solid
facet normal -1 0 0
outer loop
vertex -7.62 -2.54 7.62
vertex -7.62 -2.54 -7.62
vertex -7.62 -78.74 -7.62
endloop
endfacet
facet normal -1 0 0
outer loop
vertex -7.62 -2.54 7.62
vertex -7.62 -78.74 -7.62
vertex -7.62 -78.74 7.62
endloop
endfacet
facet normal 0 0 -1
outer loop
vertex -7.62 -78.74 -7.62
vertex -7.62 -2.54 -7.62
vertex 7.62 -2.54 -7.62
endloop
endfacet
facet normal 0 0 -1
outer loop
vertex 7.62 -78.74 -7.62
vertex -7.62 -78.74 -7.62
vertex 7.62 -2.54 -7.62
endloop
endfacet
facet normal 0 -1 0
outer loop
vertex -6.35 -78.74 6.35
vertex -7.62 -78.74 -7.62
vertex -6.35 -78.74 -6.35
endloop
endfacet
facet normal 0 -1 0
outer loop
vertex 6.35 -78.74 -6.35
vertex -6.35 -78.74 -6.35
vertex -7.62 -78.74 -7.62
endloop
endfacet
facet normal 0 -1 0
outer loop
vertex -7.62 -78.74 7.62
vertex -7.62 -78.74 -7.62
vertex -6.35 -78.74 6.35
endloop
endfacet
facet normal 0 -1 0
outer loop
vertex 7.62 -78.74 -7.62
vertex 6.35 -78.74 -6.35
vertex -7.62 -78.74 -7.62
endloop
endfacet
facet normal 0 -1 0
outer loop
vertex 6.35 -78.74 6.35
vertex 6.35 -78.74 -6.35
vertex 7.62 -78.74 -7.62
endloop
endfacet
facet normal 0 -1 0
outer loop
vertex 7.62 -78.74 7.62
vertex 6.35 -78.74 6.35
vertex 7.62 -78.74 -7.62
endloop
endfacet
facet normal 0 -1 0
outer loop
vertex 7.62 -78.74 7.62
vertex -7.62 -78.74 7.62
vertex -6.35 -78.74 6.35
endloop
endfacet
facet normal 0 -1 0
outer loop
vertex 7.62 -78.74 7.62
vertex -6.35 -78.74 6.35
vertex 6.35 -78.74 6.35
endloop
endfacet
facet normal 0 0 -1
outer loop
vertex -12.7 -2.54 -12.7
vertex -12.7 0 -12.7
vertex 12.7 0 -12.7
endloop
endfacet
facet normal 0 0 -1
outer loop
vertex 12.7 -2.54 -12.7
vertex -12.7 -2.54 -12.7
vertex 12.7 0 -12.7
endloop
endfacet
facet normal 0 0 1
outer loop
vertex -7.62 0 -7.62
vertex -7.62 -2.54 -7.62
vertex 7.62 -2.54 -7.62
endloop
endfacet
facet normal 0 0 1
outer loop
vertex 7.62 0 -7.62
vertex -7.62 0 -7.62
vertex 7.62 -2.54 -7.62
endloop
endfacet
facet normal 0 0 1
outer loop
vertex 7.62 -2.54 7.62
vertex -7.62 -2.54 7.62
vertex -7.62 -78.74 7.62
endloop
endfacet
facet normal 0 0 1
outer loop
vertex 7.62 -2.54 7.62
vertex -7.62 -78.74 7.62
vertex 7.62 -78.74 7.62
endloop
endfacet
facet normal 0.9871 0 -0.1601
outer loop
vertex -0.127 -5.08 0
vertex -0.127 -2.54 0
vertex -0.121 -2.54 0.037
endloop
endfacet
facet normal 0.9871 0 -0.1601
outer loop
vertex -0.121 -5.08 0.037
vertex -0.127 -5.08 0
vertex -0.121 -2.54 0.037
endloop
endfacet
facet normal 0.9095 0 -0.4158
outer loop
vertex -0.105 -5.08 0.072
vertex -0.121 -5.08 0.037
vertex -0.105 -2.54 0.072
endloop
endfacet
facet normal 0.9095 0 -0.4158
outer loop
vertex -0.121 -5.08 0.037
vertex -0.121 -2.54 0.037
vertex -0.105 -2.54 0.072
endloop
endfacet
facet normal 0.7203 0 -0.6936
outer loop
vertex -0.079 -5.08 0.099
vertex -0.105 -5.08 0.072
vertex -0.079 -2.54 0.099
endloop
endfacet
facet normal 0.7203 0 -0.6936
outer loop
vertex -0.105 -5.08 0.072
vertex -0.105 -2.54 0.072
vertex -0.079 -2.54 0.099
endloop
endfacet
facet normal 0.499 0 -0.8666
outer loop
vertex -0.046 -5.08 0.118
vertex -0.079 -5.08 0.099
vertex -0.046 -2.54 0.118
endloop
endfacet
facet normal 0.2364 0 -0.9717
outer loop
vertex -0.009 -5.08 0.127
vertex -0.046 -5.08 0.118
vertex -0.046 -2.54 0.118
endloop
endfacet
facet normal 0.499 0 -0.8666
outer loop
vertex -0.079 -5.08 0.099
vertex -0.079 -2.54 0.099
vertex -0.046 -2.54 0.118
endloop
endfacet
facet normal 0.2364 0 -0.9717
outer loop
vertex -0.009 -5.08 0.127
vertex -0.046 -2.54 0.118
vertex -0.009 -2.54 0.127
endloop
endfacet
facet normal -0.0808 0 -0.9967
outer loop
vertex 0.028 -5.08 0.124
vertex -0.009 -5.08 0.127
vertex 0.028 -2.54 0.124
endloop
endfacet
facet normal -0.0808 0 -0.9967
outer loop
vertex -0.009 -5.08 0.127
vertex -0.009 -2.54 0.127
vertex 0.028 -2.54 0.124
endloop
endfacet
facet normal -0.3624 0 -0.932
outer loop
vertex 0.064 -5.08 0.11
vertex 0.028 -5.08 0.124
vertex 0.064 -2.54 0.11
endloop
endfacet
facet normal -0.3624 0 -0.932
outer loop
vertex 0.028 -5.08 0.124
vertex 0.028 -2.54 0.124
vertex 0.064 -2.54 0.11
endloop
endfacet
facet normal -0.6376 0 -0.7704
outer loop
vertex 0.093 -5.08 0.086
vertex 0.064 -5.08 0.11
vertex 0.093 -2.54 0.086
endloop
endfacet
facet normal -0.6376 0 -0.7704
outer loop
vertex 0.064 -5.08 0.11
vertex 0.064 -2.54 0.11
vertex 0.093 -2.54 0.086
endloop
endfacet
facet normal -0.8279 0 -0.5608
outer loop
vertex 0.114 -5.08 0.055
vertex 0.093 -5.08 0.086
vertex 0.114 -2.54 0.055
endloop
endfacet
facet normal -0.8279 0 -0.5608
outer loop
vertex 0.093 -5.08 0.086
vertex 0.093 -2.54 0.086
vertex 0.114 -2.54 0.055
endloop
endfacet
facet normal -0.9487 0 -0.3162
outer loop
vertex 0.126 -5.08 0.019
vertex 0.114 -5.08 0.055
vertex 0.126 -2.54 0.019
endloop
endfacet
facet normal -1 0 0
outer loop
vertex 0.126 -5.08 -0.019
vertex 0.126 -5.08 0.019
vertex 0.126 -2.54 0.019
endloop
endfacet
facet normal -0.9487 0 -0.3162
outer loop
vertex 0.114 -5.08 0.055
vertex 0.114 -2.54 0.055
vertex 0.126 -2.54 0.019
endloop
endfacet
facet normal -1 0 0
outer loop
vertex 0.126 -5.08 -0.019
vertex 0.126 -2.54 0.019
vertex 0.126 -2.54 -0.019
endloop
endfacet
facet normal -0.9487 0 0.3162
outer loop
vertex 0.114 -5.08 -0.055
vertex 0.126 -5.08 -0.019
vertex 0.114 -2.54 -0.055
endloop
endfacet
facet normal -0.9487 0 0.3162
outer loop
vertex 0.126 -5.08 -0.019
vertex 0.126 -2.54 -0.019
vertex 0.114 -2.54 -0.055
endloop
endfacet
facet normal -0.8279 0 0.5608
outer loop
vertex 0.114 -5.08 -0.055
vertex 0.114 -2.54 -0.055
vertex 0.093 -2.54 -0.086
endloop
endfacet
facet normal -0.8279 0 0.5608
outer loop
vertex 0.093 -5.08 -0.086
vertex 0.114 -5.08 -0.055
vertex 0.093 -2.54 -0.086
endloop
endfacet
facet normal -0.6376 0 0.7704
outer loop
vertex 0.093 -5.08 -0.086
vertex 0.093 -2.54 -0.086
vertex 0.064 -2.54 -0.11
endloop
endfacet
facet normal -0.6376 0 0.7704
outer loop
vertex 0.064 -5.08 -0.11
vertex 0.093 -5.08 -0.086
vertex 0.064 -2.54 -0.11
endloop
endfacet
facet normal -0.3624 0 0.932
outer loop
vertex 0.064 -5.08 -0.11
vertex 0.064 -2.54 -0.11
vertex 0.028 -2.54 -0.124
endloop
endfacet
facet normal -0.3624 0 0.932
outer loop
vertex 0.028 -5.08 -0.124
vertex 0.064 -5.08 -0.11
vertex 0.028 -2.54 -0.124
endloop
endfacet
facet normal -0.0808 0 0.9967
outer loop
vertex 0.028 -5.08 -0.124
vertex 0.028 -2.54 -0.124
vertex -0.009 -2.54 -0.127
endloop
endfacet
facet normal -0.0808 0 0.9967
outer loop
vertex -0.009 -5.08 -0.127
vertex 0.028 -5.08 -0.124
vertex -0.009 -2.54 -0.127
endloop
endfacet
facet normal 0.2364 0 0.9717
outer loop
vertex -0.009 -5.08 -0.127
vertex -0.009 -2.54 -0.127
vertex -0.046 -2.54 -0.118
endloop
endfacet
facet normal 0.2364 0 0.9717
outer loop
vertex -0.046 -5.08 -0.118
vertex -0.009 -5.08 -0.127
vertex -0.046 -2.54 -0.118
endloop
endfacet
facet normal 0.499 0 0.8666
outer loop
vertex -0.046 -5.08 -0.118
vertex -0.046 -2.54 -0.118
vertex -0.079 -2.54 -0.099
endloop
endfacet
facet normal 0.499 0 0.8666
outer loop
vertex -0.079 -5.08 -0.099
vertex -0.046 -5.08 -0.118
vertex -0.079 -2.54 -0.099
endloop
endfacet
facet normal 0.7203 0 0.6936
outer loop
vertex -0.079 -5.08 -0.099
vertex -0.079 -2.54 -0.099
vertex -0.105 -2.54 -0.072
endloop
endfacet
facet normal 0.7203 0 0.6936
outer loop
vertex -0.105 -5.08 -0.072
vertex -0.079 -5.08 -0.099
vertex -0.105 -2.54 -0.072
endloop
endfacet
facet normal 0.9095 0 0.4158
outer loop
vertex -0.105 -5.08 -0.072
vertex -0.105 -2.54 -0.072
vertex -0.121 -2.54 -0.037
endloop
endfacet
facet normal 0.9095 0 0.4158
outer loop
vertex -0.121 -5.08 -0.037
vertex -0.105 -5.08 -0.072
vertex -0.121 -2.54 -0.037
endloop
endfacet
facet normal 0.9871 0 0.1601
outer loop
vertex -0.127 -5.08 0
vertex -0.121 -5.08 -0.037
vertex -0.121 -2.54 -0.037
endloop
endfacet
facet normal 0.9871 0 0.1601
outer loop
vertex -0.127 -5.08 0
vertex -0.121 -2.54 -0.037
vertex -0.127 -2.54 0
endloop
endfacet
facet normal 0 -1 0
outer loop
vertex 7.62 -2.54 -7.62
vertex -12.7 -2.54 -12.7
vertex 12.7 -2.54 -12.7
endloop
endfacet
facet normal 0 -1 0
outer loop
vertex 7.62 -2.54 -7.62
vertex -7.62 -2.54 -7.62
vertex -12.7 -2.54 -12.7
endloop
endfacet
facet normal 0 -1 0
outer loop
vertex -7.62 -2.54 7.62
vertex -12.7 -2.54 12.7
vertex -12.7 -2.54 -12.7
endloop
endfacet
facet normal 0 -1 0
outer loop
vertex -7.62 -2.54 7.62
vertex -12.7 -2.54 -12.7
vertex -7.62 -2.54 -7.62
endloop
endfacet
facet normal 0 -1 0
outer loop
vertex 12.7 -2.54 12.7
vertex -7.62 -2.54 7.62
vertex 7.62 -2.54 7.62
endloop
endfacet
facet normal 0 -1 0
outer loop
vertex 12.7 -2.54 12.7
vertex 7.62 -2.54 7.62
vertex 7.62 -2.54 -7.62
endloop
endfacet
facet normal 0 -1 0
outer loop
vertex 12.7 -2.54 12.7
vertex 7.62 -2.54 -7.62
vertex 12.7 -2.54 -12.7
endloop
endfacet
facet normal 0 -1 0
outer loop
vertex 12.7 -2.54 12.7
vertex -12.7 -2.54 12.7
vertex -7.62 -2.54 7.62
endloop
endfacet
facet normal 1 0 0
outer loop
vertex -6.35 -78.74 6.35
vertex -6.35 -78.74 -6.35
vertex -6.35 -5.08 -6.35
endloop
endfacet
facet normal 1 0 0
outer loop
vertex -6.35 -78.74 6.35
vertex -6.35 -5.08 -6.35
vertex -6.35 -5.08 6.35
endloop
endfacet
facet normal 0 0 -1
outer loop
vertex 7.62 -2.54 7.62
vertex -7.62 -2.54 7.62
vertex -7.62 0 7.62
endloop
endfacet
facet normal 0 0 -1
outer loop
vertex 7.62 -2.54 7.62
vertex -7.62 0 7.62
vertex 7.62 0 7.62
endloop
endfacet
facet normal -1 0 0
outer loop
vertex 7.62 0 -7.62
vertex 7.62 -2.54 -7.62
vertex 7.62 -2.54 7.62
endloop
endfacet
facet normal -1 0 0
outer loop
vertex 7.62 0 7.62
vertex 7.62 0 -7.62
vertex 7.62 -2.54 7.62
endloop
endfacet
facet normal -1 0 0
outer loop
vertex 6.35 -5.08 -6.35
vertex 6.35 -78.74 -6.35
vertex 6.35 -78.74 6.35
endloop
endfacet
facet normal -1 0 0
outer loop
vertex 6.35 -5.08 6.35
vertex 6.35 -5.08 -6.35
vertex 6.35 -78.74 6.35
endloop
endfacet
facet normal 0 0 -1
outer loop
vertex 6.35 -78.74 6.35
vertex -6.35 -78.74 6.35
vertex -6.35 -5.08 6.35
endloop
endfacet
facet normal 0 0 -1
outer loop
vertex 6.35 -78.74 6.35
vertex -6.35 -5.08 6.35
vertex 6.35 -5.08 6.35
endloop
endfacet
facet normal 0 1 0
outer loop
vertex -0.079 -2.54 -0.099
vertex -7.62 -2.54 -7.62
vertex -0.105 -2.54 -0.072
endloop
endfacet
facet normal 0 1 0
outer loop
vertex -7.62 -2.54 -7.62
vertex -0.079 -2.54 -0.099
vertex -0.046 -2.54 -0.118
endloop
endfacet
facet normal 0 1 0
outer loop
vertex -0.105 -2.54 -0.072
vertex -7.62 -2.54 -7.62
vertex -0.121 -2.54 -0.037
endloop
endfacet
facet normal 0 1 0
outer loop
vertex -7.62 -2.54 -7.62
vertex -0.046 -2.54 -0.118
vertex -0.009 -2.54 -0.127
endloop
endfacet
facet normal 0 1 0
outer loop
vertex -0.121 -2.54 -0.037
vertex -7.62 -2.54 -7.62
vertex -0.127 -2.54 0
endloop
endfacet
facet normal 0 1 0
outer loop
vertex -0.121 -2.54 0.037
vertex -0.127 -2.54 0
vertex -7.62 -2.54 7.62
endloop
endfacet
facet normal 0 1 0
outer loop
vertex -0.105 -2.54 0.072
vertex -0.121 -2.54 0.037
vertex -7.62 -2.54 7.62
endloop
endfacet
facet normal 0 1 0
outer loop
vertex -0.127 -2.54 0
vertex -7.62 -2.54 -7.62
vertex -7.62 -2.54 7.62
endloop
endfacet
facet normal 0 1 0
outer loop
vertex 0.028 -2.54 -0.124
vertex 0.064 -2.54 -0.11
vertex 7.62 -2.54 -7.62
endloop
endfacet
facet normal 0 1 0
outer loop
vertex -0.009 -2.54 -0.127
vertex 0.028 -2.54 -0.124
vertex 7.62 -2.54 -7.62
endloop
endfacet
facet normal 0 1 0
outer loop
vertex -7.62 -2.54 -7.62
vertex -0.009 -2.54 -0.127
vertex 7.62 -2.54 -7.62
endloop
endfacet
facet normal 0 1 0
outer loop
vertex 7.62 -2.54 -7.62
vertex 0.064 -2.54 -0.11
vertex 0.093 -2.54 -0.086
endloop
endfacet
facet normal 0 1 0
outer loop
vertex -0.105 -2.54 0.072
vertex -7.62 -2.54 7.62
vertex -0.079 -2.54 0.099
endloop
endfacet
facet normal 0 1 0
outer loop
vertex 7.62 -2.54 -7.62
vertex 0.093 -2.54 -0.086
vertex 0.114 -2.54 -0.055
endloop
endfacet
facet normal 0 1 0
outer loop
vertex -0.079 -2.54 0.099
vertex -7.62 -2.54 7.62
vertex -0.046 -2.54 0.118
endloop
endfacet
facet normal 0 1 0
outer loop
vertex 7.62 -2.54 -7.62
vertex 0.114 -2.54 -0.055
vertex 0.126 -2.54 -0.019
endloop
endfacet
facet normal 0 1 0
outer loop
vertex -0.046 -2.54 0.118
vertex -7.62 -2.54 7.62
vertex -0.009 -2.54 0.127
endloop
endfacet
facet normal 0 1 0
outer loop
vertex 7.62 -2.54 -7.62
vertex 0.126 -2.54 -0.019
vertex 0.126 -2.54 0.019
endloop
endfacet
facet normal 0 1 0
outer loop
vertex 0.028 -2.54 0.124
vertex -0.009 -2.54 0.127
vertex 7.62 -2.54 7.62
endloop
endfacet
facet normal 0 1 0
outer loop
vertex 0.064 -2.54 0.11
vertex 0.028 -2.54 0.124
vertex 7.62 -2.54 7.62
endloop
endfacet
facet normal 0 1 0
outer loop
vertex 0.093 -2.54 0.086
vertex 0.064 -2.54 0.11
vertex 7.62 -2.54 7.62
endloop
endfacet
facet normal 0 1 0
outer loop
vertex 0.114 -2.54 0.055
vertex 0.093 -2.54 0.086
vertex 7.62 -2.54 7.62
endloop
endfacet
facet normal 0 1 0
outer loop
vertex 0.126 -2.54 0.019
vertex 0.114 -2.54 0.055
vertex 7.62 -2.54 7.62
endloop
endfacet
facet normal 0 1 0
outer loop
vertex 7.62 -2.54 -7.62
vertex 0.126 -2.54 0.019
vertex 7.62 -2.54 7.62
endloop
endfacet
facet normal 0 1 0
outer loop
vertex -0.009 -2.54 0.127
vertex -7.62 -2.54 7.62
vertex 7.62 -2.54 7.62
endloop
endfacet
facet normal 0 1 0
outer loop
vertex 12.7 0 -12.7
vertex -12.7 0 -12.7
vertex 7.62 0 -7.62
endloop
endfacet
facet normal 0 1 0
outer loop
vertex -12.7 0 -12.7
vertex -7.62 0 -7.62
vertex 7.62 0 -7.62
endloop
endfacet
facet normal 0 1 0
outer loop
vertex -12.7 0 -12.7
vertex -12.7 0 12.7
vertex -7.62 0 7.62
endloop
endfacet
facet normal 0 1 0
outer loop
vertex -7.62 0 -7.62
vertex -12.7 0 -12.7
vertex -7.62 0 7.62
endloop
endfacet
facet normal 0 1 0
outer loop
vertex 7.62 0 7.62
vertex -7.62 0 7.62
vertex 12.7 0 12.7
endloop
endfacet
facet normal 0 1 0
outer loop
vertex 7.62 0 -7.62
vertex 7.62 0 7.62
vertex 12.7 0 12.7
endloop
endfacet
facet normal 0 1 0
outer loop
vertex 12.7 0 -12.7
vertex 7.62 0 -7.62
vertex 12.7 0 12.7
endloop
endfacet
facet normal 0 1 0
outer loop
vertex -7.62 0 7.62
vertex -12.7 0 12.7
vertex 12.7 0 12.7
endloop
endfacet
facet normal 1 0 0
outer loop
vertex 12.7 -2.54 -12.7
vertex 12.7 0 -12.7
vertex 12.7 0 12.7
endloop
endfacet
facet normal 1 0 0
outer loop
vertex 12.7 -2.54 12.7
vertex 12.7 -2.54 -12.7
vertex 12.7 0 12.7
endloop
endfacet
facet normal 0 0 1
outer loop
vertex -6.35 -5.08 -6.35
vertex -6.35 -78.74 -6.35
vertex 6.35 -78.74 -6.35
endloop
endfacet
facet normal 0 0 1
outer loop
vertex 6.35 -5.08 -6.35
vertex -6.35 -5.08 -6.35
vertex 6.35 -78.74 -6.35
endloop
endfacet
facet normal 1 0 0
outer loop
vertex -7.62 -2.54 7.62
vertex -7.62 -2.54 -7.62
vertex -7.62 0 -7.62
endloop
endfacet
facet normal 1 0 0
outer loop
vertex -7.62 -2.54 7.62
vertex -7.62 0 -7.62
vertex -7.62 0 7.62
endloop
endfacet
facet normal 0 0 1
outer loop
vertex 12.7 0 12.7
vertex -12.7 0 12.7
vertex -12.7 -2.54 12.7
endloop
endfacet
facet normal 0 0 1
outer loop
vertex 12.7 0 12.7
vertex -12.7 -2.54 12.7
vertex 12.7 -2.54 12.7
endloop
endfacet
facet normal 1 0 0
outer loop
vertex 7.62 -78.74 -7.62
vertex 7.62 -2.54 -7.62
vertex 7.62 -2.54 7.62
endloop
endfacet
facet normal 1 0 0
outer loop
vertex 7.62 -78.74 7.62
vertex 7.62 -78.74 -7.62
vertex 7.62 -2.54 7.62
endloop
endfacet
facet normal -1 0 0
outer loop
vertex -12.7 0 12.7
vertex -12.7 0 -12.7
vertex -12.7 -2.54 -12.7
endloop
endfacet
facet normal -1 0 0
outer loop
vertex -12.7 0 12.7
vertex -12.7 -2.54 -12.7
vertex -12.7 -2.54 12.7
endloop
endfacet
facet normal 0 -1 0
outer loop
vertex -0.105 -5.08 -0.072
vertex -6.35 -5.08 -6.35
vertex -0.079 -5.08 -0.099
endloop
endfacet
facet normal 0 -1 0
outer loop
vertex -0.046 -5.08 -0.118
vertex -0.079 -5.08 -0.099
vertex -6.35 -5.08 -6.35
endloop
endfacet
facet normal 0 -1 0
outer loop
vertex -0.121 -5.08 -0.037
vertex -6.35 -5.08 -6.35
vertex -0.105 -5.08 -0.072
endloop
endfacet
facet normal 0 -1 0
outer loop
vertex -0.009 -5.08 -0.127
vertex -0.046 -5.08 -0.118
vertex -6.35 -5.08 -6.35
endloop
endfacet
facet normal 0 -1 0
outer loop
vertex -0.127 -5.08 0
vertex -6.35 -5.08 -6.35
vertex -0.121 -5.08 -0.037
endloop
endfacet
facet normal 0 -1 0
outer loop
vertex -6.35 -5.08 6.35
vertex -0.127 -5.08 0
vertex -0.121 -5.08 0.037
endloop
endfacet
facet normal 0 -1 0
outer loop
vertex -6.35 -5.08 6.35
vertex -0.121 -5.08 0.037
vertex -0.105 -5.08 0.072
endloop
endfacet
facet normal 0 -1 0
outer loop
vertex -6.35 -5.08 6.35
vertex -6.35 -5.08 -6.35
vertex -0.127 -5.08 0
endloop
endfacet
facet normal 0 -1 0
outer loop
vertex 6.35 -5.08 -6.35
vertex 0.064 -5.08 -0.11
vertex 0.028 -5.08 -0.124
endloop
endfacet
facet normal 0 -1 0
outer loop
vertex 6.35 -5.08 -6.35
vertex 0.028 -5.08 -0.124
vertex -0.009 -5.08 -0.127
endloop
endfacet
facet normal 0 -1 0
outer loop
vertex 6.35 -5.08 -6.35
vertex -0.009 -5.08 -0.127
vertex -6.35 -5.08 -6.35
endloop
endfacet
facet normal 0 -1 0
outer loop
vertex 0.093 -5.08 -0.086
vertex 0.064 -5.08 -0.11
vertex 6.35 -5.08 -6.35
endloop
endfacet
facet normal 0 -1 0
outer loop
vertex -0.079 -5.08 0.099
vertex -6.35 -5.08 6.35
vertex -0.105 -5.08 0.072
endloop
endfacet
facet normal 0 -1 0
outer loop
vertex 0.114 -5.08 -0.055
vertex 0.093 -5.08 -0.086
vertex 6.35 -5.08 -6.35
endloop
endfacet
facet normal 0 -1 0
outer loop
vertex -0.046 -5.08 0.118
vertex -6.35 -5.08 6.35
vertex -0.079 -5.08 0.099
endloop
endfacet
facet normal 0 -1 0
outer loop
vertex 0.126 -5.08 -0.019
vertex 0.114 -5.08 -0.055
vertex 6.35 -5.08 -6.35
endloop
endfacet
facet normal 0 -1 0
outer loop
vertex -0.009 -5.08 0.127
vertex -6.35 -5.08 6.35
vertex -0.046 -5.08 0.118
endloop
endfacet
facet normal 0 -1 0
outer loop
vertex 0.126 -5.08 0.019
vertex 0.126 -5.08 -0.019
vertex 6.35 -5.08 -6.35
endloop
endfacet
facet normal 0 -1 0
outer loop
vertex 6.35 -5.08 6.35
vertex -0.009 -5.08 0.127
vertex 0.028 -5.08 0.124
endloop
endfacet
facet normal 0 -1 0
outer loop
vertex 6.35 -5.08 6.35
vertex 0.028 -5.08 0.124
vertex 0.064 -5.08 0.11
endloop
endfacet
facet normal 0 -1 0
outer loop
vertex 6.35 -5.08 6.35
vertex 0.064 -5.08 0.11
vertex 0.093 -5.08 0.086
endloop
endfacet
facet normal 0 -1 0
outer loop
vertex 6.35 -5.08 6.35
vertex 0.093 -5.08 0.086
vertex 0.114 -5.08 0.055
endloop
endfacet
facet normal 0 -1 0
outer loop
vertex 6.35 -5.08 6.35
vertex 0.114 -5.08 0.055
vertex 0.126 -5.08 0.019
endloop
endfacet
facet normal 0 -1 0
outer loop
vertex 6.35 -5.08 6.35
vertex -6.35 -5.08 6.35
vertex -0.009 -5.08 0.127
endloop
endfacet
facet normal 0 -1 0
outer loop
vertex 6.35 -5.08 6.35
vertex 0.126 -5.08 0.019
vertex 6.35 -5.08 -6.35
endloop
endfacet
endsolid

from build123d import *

# Parameters (mm, degrees)
F0_W     = 25.4
F0_H     = 25.4
F1_DEPTH = 2.54
F2_W     = 15.24
F2_H     = 15.24
F3_DEPTH = 2.541
F4_W     = 15.24
F4_H     = 15.24
F5_DEPTH = 76.2
F6_W     = 12.7
F6_H     = 12.7
F7_DEPTH = 73.66
F8_R     = 0.127
F9_DEPTH = 76.201


with BuildPart() as f1:
    # F0 (on Front) → F1 (new body)
    with BuildSketch(Plane.XZ):
        Rectangle(F0_W, F0_H)
    extrude(amount=F1_DEPTH)

    # F2 (on face) → F3 (cut, through all)
    with BuildSketch(Plane.XZ.offset(2.54)):
        Rectangle(F2_W, F2_H)
    extrude(amount=-F3_DEPTH, mode=Mode.SUBTRACT)


with BuildPart() as f5:
    # F4 (on face) → F5 (new body)
    with BuildSketch(Plane.XZ.offset(2.54)):
        Rectangle(F4_W, F4_H)
    extrude(amount=F5_DEPTH)

    # F6 (on face) → F7 (cut)
    with BuildSketch(Plane.XZ.offset(78.74)):
        Rectangle(F6_W, F6_H)
    extrude(amount=-F7_DEPTH, mode=Mode.SUBTRACT)

    # F8 (on face) → F9 (cut, through all)
    with BuildSketch(Plane(origin=(0, -2.54, 0), x_dir=(-1, 0, 0), z_dir=(0, 1, 0))):
        Circle(F8_R)
    extrude(amount=-F9_DEPTH, mode=Mode.SUBTRACT)


solid = Compound([f1.part, f5.part])
